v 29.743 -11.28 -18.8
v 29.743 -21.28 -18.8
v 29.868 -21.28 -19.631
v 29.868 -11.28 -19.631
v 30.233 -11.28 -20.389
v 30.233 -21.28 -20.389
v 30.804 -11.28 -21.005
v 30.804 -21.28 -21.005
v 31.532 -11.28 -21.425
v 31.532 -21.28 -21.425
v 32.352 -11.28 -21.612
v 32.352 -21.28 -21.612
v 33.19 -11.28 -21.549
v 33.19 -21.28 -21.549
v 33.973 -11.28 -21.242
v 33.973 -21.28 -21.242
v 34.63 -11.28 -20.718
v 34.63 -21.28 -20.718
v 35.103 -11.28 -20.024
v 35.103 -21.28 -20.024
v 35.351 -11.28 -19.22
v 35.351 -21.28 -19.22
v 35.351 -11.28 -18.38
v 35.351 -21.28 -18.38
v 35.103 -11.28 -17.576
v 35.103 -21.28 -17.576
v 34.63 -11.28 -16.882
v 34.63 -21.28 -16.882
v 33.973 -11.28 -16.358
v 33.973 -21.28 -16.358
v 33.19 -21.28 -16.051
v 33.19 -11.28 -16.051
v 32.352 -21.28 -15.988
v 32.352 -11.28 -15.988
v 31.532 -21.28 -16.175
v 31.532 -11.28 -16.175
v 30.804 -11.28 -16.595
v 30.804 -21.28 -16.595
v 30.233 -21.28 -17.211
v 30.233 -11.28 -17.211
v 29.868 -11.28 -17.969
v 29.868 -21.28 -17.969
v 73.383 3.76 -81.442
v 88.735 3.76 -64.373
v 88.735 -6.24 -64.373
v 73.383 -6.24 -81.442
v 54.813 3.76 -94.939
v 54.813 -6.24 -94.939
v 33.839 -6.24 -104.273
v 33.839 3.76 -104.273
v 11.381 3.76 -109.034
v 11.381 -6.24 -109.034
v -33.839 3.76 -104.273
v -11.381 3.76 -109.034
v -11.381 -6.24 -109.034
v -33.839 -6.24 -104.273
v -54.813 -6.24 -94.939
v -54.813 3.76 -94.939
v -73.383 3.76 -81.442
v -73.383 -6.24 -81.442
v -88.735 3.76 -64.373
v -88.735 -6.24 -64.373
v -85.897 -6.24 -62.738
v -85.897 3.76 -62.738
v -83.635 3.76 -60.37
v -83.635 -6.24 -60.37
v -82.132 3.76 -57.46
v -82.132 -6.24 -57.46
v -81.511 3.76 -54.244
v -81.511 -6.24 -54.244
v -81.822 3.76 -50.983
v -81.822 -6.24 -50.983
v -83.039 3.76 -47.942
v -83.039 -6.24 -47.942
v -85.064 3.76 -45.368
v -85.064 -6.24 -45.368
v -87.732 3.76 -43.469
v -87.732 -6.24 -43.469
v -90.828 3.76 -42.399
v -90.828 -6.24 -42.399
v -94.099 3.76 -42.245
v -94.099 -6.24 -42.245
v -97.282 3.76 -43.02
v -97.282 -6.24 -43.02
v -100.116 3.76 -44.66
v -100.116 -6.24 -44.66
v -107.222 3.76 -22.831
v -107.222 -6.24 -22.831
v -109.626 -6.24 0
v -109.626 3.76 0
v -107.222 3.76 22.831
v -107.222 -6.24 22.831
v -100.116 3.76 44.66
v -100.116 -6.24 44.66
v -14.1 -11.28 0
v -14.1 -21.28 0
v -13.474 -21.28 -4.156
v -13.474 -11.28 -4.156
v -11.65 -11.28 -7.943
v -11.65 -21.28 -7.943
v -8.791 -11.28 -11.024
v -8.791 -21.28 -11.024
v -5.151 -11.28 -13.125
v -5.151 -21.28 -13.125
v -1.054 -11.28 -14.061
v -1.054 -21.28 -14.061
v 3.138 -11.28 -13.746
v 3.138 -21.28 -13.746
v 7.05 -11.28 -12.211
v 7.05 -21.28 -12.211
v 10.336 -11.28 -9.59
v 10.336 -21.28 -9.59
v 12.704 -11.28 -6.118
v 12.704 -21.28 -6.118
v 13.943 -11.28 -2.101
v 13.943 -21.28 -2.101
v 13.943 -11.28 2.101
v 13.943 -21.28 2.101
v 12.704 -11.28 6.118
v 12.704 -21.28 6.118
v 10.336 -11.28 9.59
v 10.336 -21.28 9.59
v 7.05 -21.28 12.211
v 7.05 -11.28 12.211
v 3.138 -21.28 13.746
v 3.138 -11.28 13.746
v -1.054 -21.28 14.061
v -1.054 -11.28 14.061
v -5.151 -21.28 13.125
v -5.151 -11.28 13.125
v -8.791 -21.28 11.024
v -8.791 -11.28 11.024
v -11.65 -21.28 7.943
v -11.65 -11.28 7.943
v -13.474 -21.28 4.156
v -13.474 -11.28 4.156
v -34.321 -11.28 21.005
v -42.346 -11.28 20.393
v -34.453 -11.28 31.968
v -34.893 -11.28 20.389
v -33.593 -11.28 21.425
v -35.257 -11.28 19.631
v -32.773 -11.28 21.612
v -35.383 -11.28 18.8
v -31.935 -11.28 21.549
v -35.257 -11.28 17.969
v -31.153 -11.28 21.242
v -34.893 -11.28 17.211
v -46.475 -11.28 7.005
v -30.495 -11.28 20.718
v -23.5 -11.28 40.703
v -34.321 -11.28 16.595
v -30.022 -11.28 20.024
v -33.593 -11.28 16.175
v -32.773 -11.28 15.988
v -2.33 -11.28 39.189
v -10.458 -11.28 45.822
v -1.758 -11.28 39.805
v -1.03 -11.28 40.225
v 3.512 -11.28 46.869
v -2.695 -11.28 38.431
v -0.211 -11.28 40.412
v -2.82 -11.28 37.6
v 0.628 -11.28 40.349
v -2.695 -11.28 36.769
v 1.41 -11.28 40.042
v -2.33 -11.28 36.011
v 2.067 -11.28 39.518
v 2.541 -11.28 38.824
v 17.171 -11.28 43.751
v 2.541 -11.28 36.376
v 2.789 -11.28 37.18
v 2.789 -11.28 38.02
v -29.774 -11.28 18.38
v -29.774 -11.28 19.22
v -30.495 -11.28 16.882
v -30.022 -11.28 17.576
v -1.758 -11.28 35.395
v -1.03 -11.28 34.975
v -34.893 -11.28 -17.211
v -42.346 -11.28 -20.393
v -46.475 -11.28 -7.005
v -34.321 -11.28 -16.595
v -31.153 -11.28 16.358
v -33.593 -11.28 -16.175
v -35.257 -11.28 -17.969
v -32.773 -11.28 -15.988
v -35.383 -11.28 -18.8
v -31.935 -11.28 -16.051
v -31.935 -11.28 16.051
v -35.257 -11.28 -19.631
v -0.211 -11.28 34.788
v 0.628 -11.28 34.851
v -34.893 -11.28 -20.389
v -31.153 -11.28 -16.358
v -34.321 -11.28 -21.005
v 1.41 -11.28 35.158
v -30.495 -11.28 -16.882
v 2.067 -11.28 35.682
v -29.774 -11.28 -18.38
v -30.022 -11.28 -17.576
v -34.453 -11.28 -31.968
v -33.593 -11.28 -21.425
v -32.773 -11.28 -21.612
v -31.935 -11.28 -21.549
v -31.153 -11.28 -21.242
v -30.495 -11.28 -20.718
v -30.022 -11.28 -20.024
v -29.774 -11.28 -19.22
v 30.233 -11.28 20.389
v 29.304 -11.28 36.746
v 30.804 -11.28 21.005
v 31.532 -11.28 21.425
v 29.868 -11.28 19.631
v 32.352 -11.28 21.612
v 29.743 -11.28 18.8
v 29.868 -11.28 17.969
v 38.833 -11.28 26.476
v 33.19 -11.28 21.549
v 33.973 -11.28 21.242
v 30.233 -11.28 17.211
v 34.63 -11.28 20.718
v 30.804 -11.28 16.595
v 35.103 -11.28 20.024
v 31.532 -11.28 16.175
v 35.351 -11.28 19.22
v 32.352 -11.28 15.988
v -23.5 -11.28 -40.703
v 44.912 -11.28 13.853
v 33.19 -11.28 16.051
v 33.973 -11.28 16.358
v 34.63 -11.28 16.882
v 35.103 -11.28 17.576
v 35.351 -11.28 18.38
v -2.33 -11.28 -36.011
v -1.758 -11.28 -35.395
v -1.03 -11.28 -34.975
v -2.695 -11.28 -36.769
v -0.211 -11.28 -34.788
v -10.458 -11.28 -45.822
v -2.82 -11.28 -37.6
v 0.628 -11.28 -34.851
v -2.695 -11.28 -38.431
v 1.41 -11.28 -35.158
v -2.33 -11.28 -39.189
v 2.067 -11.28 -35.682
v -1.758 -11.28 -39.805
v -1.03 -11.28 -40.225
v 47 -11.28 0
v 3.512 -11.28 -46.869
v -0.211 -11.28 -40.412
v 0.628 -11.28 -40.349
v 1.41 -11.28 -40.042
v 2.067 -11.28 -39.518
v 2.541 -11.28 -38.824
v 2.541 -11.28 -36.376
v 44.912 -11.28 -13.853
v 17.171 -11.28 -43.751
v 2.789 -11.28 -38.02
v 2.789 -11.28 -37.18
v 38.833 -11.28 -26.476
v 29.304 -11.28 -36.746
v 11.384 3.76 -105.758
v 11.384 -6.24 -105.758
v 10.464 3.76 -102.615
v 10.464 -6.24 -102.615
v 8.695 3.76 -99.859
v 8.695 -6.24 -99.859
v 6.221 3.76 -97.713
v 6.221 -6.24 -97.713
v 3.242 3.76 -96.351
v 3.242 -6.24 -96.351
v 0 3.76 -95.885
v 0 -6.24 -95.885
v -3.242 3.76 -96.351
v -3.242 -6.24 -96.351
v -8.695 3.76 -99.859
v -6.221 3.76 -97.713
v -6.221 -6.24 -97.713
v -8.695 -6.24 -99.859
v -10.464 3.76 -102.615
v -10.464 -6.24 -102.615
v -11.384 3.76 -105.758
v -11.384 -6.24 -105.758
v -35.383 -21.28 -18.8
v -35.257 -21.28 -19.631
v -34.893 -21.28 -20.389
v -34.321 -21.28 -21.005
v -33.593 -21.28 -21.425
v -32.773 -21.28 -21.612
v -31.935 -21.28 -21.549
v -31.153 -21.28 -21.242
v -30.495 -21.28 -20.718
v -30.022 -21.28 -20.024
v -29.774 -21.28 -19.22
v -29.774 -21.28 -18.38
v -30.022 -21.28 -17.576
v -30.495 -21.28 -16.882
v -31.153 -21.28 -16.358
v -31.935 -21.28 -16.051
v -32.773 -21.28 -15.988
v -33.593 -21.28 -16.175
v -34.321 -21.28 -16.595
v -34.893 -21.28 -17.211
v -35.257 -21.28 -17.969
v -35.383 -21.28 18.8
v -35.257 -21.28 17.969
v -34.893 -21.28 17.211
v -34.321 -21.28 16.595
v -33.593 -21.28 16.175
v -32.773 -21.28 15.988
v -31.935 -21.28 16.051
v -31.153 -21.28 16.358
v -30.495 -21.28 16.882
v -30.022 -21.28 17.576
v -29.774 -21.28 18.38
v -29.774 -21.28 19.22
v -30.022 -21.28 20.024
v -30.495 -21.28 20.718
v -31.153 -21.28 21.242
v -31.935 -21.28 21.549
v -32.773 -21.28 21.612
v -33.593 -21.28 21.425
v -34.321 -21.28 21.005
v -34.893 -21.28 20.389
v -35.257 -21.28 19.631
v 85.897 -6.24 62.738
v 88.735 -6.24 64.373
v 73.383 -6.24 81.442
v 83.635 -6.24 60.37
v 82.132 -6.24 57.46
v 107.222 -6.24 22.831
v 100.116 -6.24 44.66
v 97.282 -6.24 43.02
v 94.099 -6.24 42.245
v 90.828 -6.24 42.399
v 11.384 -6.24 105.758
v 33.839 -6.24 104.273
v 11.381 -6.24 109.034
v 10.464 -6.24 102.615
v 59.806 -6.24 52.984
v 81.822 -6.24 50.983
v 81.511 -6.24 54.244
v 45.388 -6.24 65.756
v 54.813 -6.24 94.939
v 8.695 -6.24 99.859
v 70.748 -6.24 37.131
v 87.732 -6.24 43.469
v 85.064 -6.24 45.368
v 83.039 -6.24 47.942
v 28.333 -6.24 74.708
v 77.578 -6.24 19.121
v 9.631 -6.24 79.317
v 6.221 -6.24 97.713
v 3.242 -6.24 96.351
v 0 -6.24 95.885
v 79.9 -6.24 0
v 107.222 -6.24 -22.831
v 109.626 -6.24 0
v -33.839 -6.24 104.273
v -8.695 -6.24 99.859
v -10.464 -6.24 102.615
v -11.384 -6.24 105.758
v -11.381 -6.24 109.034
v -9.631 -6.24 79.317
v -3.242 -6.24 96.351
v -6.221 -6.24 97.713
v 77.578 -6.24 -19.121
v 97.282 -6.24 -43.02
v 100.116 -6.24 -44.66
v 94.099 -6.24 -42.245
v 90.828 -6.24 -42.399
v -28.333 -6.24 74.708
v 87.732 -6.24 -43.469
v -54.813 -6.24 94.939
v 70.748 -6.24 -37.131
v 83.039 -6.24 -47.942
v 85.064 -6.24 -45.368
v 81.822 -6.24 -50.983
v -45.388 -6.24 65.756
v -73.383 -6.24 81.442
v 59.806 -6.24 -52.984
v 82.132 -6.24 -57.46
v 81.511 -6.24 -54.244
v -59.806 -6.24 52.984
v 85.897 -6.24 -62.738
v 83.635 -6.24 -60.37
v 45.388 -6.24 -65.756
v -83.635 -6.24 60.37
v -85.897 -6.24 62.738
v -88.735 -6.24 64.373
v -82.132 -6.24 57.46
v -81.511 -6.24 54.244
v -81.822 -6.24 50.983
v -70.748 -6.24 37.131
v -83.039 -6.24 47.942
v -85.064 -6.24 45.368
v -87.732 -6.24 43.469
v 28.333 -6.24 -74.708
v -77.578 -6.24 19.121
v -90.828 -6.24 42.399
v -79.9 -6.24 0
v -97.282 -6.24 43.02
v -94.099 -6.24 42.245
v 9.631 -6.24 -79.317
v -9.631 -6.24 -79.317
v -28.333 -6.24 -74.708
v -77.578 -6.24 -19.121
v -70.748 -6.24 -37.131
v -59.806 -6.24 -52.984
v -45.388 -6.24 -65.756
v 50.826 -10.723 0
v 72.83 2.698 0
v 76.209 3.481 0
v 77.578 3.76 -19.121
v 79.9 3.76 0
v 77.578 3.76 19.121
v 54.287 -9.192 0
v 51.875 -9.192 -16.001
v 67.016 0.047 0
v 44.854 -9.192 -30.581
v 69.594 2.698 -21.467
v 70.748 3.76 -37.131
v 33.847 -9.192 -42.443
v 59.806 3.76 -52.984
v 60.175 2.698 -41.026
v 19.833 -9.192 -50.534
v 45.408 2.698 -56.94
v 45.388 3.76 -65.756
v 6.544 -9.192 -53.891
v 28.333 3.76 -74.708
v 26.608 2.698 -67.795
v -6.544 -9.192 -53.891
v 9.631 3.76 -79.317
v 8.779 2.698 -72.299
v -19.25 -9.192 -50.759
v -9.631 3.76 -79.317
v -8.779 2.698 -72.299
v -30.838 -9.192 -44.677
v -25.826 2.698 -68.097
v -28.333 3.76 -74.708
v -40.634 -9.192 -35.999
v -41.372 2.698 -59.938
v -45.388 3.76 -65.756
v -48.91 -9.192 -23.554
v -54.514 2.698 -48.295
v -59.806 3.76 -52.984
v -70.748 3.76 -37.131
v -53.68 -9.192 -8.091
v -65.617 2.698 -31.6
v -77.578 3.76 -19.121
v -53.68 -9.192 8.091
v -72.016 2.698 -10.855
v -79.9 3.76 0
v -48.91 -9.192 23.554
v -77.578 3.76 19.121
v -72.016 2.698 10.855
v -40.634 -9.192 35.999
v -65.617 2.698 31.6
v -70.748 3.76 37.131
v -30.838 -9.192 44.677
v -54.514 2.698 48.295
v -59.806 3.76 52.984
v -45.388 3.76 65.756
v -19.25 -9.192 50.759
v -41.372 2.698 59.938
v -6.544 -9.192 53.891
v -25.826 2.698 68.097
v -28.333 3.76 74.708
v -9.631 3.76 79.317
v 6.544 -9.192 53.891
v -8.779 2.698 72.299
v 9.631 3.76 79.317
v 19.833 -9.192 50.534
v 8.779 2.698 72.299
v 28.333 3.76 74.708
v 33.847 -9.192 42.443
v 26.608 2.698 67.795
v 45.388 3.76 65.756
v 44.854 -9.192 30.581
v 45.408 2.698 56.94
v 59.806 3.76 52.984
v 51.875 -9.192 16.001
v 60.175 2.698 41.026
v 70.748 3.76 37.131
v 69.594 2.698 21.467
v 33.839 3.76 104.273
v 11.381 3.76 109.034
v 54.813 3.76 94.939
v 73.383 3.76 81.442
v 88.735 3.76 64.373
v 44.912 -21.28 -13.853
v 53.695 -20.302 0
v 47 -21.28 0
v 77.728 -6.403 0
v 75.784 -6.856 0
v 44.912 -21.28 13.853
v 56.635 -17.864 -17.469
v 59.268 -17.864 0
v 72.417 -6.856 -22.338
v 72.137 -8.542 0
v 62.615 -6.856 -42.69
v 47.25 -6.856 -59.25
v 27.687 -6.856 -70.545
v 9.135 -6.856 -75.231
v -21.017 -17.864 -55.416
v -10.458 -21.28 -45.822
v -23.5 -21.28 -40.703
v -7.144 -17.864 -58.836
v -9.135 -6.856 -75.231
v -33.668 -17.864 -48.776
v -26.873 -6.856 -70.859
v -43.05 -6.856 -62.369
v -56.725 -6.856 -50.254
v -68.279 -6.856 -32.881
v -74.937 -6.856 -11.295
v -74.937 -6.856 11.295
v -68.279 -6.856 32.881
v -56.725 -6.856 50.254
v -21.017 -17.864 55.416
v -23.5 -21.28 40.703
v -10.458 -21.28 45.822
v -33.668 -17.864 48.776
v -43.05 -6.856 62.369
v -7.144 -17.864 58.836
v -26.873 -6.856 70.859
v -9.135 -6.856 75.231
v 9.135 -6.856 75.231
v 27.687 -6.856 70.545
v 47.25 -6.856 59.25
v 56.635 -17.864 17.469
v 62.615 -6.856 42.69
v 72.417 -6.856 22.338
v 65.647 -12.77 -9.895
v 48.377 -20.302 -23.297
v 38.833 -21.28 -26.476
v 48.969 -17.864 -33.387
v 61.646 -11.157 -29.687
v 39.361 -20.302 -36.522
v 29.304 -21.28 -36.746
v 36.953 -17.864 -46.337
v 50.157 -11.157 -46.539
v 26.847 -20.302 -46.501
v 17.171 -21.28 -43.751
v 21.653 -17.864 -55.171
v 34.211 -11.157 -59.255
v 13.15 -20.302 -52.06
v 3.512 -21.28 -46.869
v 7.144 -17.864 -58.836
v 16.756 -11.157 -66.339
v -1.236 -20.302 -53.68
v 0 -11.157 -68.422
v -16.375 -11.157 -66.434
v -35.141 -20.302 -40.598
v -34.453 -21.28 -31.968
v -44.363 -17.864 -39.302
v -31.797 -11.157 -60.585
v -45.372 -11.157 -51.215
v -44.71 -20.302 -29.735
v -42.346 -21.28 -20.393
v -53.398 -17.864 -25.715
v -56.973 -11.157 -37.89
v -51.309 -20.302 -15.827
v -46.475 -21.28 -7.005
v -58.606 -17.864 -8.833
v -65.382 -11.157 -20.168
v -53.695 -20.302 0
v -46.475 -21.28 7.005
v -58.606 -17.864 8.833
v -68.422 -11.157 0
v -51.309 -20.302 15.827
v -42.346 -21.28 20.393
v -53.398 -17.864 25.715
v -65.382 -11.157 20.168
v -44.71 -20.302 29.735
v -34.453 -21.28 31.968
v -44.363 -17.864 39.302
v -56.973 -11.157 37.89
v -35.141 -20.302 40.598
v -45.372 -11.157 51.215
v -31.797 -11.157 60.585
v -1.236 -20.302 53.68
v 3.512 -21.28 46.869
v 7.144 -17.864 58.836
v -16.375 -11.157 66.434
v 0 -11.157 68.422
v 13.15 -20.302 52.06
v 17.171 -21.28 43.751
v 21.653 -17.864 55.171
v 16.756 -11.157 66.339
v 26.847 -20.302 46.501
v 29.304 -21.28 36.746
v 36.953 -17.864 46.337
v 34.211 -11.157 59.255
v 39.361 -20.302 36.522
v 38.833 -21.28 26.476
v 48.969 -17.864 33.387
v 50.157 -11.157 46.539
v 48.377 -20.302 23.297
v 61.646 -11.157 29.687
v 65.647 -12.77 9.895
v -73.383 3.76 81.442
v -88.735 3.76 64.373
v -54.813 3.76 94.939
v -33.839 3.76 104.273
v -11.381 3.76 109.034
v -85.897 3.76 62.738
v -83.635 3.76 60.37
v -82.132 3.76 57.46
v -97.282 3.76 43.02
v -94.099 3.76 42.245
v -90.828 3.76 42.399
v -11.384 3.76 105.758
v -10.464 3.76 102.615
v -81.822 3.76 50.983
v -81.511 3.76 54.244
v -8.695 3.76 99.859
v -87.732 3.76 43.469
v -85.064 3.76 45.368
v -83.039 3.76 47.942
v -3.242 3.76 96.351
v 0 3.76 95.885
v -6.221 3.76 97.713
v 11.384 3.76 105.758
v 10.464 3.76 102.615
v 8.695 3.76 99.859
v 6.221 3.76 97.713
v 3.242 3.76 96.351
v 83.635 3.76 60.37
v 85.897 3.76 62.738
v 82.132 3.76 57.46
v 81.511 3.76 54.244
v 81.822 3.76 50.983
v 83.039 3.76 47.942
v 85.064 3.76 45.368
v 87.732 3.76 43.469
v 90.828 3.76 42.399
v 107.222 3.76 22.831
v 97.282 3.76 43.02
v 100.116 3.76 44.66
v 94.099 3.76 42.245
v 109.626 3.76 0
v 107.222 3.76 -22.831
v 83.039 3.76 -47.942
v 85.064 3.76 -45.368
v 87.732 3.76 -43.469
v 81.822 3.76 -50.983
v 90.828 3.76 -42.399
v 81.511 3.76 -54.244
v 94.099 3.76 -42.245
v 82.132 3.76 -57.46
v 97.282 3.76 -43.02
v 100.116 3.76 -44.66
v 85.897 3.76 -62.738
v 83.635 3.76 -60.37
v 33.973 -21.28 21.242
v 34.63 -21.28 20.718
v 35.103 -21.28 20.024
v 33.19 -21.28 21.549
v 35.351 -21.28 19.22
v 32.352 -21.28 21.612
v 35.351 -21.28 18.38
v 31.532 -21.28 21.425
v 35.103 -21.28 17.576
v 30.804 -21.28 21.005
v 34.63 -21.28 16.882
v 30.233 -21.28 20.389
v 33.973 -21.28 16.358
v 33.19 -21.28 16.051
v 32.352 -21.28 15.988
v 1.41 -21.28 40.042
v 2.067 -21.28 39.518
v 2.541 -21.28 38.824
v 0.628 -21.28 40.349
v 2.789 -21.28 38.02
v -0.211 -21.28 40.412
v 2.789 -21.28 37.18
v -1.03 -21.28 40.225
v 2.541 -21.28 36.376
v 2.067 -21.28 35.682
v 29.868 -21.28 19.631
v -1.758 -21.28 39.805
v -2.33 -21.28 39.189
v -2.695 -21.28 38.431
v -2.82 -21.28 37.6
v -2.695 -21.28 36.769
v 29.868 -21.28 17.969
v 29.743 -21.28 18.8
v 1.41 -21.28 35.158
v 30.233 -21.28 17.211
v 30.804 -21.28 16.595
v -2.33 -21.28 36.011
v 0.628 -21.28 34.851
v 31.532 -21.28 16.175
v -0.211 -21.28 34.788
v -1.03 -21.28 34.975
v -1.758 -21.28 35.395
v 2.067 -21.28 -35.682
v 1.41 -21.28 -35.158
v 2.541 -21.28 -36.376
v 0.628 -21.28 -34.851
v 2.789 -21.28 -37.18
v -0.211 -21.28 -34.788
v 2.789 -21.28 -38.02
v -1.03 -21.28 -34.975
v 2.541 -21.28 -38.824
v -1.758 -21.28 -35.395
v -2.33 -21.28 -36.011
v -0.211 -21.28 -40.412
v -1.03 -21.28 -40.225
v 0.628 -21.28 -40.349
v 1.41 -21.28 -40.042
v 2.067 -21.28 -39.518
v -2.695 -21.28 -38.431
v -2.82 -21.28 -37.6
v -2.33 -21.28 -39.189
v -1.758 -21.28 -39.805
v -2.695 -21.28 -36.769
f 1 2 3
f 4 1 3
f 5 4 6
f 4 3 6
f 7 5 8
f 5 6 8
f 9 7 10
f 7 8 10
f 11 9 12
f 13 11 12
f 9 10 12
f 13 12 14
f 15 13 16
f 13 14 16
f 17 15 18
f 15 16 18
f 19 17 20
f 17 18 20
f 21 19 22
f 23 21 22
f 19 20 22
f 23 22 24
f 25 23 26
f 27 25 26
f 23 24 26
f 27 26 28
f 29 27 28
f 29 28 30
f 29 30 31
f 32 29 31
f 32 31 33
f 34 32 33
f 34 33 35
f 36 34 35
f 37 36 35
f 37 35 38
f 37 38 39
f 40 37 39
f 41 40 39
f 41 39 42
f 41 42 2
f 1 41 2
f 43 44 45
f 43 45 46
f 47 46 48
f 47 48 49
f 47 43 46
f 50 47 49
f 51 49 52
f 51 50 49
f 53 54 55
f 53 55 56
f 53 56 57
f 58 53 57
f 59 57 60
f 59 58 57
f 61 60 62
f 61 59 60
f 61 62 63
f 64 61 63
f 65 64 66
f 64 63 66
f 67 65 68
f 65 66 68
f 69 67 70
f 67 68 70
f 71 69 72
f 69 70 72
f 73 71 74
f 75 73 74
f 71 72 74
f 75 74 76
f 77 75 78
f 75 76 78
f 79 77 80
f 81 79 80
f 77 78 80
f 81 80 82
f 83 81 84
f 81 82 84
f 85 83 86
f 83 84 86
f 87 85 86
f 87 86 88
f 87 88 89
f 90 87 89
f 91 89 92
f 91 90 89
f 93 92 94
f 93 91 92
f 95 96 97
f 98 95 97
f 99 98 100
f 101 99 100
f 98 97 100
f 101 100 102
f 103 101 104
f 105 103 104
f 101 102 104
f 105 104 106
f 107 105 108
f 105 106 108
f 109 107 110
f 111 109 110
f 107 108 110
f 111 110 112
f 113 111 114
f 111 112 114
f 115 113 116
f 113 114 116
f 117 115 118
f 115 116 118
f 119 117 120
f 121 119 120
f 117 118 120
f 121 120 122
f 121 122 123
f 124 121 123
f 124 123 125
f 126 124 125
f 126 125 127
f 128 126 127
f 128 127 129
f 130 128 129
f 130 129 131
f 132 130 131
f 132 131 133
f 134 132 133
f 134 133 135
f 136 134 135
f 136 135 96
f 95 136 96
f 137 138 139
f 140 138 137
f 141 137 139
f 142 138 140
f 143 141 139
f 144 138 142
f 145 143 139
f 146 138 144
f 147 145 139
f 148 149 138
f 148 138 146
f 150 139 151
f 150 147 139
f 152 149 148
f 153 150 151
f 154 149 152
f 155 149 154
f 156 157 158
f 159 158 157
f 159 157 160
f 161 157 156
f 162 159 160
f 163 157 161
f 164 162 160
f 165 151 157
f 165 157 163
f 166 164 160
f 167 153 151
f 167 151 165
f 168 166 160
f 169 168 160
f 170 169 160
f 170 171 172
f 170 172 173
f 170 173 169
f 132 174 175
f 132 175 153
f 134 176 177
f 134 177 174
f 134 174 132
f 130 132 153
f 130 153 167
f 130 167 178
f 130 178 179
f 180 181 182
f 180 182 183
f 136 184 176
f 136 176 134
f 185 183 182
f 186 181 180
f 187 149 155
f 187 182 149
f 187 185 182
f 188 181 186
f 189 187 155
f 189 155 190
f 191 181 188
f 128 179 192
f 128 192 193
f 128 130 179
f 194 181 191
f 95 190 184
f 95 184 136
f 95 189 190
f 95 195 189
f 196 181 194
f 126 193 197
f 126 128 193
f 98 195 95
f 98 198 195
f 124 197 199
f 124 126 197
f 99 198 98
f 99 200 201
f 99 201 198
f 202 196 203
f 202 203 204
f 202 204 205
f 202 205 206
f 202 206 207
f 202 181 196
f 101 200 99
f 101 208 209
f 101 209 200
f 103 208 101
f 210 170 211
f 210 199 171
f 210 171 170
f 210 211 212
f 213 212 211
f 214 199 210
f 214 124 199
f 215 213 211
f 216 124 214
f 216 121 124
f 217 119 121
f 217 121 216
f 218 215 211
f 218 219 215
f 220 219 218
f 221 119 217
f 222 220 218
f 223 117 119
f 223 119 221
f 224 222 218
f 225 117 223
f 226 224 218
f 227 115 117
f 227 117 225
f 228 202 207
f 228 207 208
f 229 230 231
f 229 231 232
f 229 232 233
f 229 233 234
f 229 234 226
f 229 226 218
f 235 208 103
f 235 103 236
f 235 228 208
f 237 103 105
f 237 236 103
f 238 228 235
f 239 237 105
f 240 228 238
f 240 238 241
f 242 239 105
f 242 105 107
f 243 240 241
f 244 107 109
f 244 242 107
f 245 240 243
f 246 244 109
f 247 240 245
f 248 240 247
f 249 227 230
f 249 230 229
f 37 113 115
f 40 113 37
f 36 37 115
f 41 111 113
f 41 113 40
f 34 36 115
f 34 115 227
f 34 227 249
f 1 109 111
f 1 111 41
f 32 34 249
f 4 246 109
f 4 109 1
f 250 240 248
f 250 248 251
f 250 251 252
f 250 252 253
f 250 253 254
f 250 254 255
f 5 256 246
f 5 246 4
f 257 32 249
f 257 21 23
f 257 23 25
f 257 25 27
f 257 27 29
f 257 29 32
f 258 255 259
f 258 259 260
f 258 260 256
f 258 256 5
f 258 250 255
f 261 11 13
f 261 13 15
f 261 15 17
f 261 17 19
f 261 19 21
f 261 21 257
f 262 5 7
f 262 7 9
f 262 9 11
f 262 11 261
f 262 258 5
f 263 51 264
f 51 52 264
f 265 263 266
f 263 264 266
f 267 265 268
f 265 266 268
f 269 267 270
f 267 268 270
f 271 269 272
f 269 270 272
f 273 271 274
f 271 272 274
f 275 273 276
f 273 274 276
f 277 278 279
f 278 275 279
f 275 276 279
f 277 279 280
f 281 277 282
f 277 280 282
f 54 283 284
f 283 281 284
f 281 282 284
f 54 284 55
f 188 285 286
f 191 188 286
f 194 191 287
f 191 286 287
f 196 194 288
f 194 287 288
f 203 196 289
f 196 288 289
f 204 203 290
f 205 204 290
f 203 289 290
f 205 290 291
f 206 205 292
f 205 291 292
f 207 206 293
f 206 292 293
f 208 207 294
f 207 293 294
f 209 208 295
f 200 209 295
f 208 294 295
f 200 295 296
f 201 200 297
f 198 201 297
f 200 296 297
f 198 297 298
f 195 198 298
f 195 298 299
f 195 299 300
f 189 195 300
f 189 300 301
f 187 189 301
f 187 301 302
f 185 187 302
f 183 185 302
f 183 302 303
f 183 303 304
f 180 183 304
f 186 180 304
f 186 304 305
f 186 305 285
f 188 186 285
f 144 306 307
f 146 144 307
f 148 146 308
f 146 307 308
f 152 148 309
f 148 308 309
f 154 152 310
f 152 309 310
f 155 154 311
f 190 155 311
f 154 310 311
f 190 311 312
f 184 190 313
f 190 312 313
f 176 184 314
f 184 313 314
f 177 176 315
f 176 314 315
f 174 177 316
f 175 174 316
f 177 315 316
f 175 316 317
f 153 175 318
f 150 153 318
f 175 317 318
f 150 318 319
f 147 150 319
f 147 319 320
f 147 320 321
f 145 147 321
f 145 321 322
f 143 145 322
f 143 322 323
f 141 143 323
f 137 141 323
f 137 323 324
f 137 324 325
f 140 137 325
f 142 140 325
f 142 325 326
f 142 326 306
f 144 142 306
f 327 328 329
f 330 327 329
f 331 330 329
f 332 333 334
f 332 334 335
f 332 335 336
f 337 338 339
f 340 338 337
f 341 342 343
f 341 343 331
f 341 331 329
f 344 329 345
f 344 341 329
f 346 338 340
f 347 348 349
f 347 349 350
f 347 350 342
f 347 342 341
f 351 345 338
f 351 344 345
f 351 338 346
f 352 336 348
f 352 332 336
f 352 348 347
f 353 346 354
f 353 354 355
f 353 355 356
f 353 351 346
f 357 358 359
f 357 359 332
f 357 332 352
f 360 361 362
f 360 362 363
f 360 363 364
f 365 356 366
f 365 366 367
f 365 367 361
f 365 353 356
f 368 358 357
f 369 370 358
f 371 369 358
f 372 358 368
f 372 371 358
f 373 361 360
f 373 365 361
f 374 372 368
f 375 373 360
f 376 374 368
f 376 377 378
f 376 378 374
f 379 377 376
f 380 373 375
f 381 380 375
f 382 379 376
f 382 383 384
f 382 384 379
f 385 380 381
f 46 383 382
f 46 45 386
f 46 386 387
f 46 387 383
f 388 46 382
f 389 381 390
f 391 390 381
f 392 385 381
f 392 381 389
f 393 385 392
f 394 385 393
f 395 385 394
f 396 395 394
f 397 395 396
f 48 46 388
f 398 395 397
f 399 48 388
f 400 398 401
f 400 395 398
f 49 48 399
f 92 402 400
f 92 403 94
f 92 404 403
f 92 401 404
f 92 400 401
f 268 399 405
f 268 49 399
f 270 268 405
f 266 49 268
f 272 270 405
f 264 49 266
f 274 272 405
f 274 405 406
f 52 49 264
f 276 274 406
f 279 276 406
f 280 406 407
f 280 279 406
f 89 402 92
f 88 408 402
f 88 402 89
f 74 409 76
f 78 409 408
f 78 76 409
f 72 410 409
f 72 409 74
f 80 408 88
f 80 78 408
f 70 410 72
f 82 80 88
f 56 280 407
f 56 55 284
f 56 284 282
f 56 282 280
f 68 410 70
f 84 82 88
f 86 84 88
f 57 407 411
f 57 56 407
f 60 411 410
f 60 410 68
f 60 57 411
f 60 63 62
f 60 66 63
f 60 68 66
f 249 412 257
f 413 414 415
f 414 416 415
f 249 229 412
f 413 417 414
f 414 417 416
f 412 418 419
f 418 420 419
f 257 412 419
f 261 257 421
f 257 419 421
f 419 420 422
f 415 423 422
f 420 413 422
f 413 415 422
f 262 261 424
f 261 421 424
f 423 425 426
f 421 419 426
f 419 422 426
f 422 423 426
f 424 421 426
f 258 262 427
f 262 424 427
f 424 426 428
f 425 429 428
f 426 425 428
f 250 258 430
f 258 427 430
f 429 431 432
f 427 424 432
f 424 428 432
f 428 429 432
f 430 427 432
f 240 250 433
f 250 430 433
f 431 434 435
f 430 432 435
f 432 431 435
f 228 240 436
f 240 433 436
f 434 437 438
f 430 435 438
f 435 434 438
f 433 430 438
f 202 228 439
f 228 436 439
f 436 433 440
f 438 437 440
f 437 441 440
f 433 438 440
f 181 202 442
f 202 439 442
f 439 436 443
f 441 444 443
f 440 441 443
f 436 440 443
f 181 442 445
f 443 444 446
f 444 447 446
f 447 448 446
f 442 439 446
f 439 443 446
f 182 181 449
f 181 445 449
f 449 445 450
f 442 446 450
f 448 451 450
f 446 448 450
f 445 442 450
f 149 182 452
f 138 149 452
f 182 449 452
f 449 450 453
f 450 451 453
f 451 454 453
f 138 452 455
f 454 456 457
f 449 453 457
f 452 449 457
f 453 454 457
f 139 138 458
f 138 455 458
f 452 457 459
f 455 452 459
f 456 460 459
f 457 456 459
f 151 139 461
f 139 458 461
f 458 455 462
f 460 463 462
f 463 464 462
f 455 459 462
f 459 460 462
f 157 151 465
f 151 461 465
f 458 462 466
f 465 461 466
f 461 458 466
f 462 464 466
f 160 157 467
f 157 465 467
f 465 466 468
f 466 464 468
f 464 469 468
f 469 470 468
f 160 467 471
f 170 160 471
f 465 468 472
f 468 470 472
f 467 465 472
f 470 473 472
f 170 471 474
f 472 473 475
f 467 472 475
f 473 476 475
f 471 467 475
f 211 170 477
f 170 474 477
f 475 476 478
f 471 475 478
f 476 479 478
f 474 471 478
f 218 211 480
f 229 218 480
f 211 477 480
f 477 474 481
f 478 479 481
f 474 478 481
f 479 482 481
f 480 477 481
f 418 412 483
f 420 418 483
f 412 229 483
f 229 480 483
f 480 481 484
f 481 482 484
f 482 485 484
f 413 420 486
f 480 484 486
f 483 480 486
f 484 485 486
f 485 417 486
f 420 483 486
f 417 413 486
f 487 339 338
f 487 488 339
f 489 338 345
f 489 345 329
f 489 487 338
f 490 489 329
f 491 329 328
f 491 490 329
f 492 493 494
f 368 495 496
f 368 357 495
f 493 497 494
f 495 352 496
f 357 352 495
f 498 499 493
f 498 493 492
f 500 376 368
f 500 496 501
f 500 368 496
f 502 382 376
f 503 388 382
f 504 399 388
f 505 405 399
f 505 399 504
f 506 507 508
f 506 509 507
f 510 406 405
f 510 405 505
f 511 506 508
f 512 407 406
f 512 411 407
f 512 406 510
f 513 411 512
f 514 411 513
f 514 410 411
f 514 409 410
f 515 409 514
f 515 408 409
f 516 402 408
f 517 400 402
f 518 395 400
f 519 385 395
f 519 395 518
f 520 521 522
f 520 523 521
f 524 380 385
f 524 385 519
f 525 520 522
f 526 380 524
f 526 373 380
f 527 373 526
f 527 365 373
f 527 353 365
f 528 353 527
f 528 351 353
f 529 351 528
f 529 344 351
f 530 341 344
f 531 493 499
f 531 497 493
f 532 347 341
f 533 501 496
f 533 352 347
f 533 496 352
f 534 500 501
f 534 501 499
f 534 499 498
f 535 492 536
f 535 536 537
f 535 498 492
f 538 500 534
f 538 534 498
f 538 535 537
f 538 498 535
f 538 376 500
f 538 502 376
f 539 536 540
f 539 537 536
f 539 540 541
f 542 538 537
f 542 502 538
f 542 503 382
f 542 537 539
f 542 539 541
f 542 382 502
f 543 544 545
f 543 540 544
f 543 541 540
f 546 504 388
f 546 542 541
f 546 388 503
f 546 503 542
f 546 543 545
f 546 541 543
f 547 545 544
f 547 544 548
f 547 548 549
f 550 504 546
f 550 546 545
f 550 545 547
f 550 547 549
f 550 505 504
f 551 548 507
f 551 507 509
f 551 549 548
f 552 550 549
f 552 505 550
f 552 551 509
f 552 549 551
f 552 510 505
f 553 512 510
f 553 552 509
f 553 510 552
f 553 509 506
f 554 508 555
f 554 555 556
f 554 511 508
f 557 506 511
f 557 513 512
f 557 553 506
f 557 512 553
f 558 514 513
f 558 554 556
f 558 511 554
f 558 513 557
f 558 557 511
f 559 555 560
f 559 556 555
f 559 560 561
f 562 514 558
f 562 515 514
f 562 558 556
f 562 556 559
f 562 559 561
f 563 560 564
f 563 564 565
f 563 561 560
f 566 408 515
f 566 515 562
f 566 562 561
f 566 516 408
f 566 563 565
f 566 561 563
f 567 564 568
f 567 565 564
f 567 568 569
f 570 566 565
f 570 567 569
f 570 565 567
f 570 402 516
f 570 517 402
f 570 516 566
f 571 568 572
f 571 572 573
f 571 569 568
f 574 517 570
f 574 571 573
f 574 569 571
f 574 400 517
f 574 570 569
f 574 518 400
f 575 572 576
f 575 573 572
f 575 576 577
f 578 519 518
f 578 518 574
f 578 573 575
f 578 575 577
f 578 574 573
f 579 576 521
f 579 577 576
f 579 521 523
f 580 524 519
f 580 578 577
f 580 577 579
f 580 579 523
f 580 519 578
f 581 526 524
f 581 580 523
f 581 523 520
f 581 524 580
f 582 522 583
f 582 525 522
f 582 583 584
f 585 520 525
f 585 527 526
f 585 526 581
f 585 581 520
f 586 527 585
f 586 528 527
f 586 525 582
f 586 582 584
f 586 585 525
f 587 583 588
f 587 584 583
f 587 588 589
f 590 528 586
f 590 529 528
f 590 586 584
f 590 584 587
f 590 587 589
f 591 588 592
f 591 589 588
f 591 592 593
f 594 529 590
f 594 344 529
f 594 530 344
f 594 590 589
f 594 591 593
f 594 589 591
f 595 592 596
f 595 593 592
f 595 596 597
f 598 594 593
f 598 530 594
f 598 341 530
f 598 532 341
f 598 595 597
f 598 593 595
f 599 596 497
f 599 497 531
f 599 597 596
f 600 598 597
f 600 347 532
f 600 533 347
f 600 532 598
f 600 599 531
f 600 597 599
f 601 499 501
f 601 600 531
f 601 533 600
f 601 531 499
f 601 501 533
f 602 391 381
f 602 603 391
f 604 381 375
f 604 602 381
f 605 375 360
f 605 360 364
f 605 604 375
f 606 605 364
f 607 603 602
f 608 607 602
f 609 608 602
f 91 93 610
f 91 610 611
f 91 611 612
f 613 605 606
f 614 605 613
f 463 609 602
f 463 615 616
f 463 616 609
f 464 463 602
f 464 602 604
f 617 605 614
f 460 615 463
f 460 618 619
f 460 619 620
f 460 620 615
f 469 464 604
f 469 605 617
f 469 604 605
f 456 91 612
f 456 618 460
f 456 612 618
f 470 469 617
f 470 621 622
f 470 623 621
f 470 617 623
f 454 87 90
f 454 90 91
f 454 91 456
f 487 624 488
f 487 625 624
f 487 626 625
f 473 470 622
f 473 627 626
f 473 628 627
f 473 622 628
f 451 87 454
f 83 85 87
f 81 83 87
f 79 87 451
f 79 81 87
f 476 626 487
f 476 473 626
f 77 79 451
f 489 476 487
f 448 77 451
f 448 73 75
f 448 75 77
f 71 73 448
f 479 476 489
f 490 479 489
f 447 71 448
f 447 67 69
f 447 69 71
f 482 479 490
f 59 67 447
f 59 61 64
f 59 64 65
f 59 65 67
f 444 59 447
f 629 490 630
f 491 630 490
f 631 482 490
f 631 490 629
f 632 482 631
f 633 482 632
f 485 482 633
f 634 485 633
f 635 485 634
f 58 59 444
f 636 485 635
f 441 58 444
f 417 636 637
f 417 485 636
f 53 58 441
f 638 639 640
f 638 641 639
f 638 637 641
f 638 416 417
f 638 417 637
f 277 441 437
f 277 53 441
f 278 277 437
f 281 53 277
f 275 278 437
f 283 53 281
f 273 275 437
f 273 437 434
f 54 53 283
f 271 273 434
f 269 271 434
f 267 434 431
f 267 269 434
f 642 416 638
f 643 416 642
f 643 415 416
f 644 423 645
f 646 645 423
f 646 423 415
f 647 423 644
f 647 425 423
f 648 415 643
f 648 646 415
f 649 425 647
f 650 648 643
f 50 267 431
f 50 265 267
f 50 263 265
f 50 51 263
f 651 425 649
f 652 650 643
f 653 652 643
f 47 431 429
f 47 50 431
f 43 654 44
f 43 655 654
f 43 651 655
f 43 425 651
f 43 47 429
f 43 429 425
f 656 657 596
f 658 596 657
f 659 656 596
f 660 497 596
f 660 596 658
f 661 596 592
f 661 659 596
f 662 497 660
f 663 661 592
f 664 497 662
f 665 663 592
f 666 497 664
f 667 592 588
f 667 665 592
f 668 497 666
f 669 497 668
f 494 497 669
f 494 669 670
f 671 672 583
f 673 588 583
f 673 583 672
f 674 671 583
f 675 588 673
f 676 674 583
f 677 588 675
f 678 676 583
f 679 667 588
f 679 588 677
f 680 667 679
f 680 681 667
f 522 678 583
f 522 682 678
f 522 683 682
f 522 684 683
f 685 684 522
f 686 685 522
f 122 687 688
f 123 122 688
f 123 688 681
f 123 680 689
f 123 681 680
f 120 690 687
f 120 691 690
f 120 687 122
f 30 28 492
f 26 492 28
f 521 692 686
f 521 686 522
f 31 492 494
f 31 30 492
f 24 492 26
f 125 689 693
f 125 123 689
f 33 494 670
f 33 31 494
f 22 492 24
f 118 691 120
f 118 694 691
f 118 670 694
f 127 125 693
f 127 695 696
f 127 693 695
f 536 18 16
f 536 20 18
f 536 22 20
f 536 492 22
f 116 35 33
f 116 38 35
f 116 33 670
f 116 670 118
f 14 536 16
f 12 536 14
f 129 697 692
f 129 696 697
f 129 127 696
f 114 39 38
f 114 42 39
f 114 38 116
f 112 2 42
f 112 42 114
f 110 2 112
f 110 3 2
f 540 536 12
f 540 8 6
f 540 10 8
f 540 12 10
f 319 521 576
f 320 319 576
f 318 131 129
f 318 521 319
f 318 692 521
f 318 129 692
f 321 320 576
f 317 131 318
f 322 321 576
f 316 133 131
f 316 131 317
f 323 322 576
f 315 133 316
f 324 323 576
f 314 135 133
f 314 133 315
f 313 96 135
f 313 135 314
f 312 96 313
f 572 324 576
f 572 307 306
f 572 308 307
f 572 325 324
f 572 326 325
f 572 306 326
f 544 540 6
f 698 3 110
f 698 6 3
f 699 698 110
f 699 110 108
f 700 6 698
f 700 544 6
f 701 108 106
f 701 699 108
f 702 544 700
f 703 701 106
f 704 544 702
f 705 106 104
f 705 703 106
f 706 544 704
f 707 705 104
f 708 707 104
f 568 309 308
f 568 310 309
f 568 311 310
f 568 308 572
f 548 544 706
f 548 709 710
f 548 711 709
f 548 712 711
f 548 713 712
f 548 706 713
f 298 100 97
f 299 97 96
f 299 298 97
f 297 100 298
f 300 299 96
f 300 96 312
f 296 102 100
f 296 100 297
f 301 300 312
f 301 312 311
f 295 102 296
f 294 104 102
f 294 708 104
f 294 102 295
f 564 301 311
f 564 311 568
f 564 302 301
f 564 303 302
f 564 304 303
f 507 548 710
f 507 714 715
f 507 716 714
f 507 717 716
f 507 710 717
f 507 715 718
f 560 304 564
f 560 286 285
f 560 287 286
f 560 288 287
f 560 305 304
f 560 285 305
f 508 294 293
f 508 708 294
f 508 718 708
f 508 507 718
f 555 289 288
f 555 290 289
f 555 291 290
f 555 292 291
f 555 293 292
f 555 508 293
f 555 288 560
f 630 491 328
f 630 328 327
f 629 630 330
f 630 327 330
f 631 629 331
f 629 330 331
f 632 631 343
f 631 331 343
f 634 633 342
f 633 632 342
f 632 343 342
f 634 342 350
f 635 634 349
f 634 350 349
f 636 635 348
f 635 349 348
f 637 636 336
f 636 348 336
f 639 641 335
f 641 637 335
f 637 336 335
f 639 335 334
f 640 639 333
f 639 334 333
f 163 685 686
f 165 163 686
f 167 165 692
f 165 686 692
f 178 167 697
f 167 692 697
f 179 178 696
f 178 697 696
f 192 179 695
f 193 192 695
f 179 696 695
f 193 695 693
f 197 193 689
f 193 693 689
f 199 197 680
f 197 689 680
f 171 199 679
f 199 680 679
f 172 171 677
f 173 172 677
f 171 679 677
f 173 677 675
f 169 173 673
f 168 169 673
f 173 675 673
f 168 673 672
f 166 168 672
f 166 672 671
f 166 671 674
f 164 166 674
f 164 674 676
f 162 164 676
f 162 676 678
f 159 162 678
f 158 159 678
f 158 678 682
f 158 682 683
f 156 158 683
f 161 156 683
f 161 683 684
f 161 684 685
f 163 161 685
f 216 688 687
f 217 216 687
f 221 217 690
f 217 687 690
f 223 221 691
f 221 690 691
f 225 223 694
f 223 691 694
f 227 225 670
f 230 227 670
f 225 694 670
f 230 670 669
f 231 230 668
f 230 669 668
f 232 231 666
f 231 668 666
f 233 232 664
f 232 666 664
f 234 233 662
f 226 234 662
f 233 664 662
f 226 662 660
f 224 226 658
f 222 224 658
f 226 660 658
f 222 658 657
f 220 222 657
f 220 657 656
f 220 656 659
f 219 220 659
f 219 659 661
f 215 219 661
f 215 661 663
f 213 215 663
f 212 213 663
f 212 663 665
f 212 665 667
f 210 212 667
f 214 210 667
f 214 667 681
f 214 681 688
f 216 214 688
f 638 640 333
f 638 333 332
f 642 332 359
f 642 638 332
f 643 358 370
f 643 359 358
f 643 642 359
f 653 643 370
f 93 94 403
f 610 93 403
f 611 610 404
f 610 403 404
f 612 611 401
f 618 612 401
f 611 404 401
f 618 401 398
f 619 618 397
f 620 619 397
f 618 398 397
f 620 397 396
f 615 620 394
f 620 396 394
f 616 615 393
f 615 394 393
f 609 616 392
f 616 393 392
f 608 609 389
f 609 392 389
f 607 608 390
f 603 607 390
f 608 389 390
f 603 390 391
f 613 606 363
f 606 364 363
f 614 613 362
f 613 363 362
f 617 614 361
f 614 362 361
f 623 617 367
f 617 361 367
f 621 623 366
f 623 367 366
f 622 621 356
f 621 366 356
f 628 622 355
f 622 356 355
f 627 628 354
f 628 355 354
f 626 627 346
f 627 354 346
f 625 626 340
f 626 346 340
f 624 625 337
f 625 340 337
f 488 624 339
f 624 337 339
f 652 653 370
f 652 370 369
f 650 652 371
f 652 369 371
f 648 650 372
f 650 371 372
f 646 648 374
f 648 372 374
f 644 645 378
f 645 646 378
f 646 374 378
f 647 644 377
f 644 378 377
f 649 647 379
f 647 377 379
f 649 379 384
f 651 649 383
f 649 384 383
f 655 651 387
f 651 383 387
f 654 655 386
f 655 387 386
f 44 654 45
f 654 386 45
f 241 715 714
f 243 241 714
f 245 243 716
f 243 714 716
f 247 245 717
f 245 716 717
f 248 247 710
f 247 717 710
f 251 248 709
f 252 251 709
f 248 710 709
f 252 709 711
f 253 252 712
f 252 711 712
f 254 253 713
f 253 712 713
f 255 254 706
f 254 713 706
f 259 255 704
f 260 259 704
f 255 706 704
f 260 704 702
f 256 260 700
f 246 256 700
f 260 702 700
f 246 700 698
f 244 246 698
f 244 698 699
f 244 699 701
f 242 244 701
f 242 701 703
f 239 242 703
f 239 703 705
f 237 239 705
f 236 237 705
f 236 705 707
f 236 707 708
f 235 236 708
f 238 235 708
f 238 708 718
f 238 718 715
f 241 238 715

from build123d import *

# Parameters (mm, degrees)
F_23_0_23_DIAMETER_HOLE2_D = 23
M5_CLEARANCE_HOLE1_D       = 5.64
M5_CLEARANCE_HOLE1_DEPTH   = 10
M25_CLEARANCE_HOLE1_D      = 28.2


with BuildPart() as part:
    # Sketch1 → Revolve1 (revolve)
    with BuildSketch(Plane(origin=(0, 0, 0), x_dir=(-1, 0, 0), z_dir=(0, 0, -1))):
        with BuildLine():
            Line((0, -21.28), (-47, -21.28))
            add(Edge.make_bspline(
                [(-47, -21.28), (-48.103397798, -21.28), (-50.355208609, -21.119817001), (-53.414331373, -20.453461244), (-56.243773206, -19.439198841), (-59.638625381, -17.760520516), (-63.24918477, -15.301778213), (-66.920694033, -12.332831089), (-70.220914899, -9.726996026), (-72.788397394, -8.094435047), (-74.823949114, -7.162885506), (-76.366758302, -6.651929985), (-77.75784267, -6.37664197), (-78.927463, -6.261355146), (-79.581421905, -6.24), (-79.9, -6.24)],
                knots=[0, 0, 0, 0, 0.0625, 0.125, 0.1875, 0.25, 0.375, 0.5, 0.625, 0.75, 0.8125, 0.875, 0.9375, 0.96875, 1, 1, 1, 1], degree=3))
            Line((-79.9, -6.24), (-109.626011544, -6.24))
            Line((-109.626011544, -6.24), (-109.626011544, 3.76))
            Line((-109.626011544, 3.76), (-79.9, 3.76))
            add(Edge.make_bspline(
                [(-47, -11.28), (-47.323760623, -11.28), (-47.9824274, -11.256801184), (-49.205881481, -11.125337538), (-50.652473039, -10.813460463), (-52.303634488, -10.223599604), (-54.465904258, -9.163050099), (-57.16913982, -7.350711887), (-60.559773273, -4.61985368), (-64.271682561, -1.670850737), (-67.847161888, 0.63981733), (-71.12599799, 2.151104958), (-73.810430606, 3.042514571), (-76.243250574, 3.525131309), (-78.291888688, 3.725497683), (-79.368008784, 3.76), (-79.9, 3.76)],
                knots=[0, 0, 0, 0, 0.03125, 0.0625, 0.125, 0.1875, 0.25, 0.375, 0.5, 0.625, 0.75, 0.8125, 0.875, 0.9375, 0.96875, 1, 1, 1, 1], degree=3))
            Line((-47, -11.28), (0, -11.28))
            Line((0, -11.28), (0, -21.28))
        make_face()
    revolve(axis=Axis((0, -15.043324423, 0), (0, 1, 0)))

    # Ø23.0 (23) Diameter Hole2 (through all)
    with Locations(Plane(origin=(0, 3.76, 0), x_dir=(1, 0, 0), z_dir=(0, 1, 0))):
        with Locations((-92.997954647, 53.69239415), (92.997954647, -53.69239415), (92.997954647, 53.69239415), (0, 107.3847883), (-92.997954647, -53.69239415), (0, -107.3847883)):
            Hole(F_23_0_23_DIAMETER_HOLE2_D / 2)

    # M5 Clearance Hole1
    with Locations(Plane(origin=(0, -11.28, 0), x_dir=(1, 0, 0), z_dir=(0, 1, 0))):
        with Locations((-32.562555182, 18.8), (0, 37.6), (32.562555182, 18.8), (32.562555182, -18.8), (0, -37.6), (-32.562555182, -18.8)):
            Hole(M5_CLEARANCE_HOLE1_D / 2, depth=M5_CLEARANCE_HOLE1_DEPTH)

    # M25 Clearance Hole1 (through all)
    with Locations(Plane(origin=(0, -11.28, 0), x_dir=(1, 0, 0), z_dir=(0, 1, 0))):
        with Locations((0, 0)):
            Hole(M25_CLEARANCE_HOLE1_D / 2)


solid = part.part
